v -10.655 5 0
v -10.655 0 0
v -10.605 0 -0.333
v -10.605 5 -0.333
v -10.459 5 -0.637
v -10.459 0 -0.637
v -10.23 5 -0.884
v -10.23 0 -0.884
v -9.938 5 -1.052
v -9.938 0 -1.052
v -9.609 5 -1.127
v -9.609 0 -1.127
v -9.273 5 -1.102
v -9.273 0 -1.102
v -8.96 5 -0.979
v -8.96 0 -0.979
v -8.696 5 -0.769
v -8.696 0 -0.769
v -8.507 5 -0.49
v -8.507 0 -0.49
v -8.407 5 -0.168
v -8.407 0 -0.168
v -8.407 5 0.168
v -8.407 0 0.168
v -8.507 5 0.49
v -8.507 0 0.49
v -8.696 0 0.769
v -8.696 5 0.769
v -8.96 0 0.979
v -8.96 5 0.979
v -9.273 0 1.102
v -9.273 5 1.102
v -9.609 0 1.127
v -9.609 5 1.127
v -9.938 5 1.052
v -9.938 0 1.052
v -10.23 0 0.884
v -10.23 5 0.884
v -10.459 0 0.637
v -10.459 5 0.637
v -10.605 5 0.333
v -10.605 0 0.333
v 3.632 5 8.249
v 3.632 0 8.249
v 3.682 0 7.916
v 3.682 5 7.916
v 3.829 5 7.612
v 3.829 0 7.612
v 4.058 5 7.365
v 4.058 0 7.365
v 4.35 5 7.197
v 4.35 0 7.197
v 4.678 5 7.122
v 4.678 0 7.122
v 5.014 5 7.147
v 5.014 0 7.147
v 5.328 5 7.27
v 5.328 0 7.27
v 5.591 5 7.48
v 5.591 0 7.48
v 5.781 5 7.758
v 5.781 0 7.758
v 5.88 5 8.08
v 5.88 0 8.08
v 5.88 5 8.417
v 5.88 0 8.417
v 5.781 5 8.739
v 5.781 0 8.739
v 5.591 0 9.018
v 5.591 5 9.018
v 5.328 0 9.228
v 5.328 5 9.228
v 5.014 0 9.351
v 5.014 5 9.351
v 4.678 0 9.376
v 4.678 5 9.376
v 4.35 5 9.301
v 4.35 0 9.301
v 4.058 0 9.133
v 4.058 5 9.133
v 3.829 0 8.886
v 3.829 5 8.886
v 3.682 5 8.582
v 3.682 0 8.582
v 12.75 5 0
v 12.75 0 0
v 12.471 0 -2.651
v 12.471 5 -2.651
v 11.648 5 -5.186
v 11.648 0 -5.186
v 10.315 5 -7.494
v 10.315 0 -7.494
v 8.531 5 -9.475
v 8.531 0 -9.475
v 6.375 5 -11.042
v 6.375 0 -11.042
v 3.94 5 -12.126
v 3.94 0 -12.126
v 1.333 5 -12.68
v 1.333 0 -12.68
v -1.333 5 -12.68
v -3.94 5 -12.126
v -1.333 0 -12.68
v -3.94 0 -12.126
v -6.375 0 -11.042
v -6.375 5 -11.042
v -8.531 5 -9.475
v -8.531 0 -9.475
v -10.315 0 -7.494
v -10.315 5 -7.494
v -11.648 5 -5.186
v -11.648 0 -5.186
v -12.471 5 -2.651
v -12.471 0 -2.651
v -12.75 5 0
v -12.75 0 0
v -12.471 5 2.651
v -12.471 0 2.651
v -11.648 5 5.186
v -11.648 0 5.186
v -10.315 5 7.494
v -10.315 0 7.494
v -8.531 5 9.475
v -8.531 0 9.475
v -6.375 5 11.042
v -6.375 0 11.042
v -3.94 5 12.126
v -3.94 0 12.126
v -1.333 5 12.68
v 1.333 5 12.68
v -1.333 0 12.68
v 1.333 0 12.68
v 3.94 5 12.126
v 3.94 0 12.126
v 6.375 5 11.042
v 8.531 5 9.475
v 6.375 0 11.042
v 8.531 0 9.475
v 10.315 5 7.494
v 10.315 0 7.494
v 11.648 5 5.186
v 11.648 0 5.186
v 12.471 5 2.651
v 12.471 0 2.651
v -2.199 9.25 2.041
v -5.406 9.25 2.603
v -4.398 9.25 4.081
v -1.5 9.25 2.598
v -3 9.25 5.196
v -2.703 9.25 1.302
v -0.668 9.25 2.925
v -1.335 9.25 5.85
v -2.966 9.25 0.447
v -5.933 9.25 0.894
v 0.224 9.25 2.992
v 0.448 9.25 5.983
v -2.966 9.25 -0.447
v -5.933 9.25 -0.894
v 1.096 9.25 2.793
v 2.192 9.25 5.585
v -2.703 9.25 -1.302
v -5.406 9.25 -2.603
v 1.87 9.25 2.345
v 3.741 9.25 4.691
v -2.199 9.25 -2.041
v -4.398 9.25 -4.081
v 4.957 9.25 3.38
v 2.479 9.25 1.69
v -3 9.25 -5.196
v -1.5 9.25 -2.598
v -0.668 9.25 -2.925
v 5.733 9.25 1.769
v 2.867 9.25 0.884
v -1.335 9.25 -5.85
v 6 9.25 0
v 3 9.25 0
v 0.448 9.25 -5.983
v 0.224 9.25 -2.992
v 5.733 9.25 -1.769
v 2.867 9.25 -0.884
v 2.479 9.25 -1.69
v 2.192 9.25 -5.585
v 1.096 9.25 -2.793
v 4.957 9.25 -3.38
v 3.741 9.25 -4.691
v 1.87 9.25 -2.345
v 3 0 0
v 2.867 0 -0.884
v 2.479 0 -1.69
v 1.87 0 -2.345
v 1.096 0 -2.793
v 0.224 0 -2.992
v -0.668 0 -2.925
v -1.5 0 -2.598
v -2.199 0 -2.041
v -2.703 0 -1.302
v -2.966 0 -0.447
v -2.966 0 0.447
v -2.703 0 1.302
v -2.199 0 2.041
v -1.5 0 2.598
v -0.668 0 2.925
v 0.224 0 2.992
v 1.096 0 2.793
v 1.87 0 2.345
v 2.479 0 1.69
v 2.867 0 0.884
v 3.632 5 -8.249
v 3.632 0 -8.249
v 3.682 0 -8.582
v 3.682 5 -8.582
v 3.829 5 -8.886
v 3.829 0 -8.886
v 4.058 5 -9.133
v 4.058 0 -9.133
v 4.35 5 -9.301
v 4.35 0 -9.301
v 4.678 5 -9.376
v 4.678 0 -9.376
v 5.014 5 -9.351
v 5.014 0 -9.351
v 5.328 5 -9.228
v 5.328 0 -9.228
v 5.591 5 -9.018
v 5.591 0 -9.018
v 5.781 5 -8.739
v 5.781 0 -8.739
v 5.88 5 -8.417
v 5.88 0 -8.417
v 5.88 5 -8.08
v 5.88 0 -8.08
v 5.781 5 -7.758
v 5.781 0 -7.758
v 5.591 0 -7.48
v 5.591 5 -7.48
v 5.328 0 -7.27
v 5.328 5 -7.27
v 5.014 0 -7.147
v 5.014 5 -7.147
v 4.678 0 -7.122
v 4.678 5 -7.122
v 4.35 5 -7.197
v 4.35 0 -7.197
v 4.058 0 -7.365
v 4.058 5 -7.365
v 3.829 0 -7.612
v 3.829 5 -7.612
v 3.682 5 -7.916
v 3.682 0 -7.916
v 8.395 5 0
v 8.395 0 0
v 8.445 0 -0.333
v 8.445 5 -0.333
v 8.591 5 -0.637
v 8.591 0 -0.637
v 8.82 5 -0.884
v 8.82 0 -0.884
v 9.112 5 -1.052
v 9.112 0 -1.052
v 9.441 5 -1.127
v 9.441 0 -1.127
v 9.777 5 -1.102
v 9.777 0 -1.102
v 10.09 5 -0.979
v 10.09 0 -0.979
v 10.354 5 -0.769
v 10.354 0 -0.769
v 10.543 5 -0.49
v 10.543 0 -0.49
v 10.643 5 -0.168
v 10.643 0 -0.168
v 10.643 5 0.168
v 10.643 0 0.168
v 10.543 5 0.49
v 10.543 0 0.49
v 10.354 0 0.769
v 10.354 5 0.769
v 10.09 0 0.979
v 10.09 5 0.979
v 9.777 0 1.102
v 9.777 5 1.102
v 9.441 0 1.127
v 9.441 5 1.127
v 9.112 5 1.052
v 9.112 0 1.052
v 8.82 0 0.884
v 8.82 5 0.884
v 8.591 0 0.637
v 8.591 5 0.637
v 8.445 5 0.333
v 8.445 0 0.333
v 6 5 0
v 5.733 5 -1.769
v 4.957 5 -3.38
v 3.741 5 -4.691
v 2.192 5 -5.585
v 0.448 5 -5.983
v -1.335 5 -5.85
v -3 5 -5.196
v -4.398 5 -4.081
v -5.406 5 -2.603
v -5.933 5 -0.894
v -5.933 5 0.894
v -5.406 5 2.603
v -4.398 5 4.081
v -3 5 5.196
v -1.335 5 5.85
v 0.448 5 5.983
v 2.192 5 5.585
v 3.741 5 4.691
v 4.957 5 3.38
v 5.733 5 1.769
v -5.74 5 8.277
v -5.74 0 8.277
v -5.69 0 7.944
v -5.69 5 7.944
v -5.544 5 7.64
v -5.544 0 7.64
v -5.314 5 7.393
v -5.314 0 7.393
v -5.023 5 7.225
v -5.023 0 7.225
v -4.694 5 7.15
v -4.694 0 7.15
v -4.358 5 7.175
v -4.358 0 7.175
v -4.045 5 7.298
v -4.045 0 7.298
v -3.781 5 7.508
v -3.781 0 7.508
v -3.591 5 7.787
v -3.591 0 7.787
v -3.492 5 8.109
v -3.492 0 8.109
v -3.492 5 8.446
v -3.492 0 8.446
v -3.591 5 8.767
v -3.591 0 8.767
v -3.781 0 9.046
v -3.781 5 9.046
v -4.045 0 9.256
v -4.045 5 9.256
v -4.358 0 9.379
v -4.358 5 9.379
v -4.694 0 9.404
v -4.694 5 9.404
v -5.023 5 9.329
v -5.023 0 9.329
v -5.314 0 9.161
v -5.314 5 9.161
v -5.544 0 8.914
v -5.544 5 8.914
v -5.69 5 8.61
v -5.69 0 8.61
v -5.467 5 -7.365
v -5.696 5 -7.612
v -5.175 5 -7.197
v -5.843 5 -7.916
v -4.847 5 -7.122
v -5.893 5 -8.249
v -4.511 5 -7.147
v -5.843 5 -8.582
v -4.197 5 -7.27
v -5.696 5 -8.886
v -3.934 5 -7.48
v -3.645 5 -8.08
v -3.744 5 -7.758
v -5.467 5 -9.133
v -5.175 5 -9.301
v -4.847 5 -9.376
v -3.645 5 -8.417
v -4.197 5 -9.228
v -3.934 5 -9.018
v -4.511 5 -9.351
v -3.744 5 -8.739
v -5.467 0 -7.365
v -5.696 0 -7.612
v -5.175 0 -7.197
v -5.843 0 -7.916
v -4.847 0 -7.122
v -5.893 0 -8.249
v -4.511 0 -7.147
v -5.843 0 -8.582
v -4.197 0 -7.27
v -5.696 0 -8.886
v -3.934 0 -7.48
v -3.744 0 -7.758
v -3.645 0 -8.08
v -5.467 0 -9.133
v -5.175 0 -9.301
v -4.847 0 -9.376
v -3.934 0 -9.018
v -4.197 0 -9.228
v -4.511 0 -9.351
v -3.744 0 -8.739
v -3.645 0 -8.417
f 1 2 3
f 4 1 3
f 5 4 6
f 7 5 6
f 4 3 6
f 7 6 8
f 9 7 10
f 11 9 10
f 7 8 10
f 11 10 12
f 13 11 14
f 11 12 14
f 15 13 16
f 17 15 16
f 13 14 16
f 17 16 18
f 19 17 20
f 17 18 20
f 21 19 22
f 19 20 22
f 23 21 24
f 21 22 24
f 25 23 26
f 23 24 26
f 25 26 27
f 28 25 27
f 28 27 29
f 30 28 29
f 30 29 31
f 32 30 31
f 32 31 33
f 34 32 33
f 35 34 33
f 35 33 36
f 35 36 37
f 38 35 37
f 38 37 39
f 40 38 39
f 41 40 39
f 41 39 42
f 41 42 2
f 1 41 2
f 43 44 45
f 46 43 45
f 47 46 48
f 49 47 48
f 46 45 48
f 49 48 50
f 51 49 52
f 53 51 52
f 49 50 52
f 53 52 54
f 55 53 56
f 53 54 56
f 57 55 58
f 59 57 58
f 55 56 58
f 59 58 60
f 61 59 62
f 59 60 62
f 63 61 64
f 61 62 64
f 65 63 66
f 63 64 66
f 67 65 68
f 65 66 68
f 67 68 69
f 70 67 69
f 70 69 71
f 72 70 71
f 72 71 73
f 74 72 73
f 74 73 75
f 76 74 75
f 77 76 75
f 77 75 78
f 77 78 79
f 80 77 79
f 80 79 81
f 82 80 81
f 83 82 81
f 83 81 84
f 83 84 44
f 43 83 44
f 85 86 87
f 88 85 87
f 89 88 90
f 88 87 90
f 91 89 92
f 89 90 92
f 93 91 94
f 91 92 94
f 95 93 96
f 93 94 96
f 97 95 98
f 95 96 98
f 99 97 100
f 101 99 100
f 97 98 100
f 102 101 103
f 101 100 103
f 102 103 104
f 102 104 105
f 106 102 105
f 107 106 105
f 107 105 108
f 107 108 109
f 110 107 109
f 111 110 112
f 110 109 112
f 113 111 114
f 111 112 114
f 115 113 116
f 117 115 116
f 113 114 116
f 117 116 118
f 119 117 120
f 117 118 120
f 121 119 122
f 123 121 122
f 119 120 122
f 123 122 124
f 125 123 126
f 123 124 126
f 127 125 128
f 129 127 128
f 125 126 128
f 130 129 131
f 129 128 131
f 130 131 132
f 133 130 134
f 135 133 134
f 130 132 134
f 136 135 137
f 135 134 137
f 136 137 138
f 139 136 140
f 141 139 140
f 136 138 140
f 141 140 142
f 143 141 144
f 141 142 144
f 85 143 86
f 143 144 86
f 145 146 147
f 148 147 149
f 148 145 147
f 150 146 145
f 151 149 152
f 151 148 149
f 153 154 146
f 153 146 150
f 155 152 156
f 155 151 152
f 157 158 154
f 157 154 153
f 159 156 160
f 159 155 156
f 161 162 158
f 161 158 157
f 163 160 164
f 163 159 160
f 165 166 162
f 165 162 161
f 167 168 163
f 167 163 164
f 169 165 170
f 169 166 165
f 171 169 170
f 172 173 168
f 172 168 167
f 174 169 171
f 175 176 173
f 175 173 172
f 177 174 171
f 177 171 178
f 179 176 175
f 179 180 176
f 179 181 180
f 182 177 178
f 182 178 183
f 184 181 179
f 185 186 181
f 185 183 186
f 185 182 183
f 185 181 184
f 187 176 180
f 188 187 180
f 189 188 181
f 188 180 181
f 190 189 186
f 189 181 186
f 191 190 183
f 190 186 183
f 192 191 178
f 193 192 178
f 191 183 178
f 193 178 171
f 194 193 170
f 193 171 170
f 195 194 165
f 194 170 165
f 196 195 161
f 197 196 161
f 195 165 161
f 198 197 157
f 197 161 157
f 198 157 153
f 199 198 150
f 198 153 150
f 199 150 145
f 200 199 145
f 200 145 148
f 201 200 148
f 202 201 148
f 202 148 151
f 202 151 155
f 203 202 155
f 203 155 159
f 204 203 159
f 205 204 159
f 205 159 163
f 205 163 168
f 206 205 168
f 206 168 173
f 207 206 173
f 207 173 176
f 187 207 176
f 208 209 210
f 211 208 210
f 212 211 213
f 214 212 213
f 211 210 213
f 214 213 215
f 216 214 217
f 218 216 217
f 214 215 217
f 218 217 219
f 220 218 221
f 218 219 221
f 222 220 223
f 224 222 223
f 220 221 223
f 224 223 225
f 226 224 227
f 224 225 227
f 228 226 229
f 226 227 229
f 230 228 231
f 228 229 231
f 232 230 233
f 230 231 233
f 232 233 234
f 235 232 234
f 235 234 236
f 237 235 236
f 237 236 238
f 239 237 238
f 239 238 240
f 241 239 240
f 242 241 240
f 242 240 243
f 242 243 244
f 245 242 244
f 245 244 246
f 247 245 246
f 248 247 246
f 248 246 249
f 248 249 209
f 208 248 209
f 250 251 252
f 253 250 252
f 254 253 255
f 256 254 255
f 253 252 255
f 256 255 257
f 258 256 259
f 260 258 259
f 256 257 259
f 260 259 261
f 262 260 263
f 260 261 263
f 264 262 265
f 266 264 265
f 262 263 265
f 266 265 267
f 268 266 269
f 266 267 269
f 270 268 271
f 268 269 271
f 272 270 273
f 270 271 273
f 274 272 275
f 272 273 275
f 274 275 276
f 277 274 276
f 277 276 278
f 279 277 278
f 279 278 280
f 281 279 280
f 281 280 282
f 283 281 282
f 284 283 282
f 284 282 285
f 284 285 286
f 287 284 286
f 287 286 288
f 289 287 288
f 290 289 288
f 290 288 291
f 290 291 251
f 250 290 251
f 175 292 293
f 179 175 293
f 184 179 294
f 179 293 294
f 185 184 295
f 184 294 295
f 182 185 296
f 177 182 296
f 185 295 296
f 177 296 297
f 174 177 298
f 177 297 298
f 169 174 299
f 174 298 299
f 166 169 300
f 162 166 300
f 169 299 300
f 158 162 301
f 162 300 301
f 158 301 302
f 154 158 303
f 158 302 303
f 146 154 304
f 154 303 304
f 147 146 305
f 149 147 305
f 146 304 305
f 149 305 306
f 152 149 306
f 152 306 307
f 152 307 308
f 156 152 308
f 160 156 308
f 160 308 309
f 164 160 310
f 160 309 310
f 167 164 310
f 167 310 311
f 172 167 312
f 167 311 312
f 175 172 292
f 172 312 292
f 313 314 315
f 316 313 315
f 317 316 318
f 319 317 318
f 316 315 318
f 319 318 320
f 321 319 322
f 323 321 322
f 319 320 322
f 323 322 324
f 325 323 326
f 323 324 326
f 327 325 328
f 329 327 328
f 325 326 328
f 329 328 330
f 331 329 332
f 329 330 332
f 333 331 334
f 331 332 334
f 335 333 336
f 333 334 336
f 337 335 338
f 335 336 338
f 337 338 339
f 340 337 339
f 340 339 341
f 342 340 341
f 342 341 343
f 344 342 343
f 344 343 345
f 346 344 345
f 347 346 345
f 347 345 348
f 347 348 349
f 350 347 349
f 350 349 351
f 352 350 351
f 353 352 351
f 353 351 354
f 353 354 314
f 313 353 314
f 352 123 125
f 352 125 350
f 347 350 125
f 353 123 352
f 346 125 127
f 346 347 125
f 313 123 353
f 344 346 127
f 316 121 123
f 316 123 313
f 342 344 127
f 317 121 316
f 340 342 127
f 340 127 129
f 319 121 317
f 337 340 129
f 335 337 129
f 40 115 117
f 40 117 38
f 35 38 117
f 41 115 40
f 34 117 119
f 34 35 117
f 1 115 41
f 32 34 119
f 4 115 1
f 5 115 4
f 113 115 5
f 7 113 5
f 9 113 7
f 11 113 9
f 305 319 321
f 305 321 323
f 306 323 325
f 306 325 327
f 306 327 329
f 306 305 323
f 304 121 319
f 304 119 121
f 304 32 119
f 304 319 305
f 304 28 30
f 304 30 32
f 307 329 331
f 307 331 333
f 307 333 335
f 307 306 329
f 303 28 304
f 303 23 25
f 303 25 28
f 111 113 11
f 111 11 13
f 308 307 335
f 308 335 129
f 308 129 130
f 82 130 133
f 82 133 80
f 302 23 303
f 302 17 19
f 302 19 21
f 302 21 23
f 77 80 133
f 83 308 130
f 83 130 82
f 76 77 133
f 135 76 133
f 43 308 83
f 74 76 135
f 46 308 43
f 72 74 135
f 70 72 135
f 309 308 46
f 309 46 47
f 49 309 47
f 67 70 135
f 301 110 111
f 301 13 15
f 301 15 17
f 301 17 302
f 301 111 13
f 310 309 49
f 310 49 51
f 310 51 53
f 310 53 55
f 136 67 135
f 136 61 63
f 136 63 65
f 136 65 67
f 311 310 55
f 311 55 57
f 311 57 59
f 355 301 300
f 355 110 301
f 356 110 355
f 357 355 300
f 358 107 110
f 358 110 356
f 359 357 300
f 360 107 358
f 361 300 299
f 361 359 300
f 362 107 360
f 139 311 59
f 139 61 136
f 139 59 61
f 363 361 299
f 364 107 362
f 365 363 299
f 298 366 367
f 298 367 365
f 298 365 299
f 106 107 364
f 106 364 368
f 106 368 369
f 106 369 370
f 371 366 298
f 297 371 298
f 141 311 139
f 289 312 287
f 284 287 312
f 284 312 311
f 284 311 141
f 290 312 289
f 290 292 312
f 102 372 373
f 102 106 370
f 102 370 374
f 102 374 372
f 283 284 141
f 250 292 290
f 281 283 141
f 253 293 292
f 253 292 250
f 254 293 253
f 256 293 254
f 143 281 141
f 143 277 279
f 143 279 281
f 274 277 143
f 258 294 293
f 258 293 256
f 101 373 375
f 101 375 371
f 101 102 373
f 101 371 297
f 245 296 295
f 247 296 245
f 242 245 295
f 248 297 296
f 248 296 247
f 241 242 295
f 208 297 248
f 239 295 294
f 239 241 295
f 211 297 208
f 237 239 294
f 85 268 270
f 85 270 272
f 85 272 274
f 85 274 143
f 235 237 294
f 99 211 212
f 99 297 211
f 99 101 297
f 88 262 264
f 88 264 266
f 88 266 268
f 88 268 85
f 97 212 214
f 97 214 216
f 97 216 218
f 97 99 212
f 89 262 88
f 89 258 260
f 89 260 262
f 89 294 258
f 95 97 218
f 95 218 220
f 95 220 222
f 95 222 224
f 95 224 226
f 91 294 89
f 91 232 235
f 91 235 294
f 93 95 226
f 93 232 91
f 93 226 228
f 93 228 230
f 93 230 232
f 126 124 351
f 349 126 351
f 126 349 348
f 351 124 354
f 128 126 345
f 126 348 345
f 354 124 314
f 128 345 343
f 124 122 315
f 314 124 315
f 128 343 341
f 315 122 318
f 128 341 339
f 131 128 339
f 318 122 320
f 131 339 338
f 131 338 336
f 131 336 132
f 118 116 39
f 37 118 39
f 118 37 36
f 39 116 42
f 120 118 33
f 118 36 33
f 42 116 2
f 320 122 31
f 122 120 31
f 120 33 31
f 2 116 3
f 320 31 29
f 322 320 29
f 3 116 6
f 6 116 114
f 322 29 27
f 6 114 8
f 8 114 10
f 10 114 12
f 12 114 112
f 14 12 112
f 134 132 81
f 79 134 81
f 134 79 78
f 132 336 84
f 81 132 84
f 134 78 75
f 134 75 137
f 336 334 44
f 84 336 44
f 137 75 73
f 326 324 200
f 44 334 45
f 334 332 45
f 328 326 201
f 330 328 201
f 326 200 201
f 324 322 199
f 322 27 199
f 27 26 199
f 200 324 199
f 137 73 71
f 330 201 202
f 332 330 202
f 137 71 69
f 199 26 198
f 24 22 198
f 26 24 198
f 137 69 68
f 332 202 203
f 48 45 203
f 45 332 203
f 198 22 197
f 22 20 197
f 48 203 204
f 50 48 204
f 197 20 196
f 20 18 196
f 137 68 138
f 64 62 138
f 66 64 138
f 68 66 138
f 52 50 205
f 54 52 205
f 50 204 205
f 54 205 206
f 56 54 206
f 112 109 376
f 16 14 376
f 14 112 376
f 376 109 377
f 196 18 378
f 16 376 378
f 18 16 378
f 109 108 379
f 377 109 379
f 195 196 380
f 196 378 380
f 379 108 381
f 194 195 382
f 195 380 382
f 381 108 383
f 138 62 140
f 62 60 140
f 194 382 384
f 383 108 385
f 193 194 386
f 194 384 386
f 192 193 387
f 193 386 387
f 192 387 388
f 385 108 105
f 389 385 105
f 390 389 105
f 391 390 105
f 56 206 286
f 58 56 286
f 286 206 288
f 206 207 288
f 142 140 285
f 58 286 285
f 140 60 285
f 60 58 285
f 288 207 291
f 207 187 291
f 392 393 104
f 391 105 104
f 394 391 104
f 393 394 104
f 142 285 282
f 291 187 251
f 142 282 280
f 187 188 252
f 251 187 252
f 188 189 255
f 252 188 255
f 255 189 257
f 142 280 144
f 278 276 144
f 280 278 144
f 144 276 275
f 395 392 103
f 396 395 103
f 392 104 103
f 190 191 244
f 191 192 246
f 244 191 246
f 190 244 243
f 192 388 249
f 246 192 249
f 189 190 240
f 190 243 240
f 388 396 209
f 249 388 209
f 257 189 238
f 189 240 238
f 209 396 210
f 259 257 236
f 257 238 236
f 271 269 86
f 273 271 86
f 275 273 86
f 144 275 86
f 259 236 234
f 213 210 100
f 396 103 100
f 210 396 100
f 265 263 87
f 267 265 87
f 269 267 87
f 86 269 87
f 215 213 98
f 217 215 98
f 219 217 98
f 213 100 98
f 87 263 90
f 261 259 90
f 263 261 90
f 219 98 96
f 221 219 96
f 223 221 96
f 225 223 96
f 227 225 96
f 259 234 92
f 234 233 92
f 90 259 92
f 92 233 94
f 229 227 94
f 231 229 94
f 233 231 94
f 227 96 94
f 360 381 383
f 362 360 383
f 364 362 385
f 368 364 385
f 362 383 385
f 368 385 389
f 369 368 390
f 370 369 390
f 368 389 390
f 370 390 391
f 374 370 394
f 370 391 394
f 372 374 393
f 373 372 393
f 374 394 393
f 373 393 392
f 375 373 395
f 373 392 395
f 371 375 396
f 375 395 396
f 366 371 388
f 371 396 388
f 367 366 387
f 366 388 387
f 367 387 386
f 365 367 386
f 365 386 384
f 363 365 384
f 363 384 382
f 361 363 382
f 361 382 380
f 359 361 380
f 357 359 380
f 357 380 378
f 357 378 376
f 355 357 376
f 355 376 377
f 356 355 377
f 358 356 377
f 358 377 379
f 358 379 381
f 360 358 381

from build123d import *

# Parameters (mm, degrees)
SKETCH1_R             = 12.75
BOSS_EXTRUDE1_DEPTH   = 5
SKETCH2_R             = 6
BOSS_EXTRUDE2_DEPTH   = 4.25
SKETCH3_R             = 3
CUT_EXTRUDE1_DEPTH    = 10.25
F_4_40_TAPPED_HOLE2_D = 2.2606


with BuildPart() as part:
    # Sketch1 → Boss-Extrude1 (new body)
    with BuildSketch(Plane(origin=(0, 0, 0), x_dir=(1, 0, 0), z_dir=(0, 1, 0))):
        Circle(SKETCH1_R)
    extrude(amount=BOSS_EXTRUDE1_DEPTH)

    # Sketch2 → Boss-Extrude2 (add)
    with BuildSketch(Plane(origin=(0, 5, 0), x_dir=(1, 0, 0), z_dir=(0, 1, 0))):
        Circle(SKETCH2_R)
    extrude(amount=BOSS_EXTRUDE2_DEPTH)

    # Sketch3 → Cut-Extrude1 (cut, through all)
    with BuildSketch(Plane(origin=(0, 9.25, 0), x_dir=(1, 0, 0), z_dir=(0, 1, 0))):
        Circle(SKETCH3_R)
    extrude(amount=-CUT_EXTRUDE1_DEPTH, mode=Mode.SUBTRACT)

    # #4-40 Tapped Hole2 (through all)
    with Locations(Plane(origin=(0, 5, 0), x_dir=(1, 0, 0), z_dir=(0, 1, 0))):
        with Locations((-4.609677481, -8.277058611), (-9.525, 0), (4.7625, -8.248891971), (9.525, 0), (-4.7625, 8.248891971), (4.7625, 8.248891971)):
            Hole(F_4_40_TAPPED_HOLE2_D / 2)


solid = part.part
